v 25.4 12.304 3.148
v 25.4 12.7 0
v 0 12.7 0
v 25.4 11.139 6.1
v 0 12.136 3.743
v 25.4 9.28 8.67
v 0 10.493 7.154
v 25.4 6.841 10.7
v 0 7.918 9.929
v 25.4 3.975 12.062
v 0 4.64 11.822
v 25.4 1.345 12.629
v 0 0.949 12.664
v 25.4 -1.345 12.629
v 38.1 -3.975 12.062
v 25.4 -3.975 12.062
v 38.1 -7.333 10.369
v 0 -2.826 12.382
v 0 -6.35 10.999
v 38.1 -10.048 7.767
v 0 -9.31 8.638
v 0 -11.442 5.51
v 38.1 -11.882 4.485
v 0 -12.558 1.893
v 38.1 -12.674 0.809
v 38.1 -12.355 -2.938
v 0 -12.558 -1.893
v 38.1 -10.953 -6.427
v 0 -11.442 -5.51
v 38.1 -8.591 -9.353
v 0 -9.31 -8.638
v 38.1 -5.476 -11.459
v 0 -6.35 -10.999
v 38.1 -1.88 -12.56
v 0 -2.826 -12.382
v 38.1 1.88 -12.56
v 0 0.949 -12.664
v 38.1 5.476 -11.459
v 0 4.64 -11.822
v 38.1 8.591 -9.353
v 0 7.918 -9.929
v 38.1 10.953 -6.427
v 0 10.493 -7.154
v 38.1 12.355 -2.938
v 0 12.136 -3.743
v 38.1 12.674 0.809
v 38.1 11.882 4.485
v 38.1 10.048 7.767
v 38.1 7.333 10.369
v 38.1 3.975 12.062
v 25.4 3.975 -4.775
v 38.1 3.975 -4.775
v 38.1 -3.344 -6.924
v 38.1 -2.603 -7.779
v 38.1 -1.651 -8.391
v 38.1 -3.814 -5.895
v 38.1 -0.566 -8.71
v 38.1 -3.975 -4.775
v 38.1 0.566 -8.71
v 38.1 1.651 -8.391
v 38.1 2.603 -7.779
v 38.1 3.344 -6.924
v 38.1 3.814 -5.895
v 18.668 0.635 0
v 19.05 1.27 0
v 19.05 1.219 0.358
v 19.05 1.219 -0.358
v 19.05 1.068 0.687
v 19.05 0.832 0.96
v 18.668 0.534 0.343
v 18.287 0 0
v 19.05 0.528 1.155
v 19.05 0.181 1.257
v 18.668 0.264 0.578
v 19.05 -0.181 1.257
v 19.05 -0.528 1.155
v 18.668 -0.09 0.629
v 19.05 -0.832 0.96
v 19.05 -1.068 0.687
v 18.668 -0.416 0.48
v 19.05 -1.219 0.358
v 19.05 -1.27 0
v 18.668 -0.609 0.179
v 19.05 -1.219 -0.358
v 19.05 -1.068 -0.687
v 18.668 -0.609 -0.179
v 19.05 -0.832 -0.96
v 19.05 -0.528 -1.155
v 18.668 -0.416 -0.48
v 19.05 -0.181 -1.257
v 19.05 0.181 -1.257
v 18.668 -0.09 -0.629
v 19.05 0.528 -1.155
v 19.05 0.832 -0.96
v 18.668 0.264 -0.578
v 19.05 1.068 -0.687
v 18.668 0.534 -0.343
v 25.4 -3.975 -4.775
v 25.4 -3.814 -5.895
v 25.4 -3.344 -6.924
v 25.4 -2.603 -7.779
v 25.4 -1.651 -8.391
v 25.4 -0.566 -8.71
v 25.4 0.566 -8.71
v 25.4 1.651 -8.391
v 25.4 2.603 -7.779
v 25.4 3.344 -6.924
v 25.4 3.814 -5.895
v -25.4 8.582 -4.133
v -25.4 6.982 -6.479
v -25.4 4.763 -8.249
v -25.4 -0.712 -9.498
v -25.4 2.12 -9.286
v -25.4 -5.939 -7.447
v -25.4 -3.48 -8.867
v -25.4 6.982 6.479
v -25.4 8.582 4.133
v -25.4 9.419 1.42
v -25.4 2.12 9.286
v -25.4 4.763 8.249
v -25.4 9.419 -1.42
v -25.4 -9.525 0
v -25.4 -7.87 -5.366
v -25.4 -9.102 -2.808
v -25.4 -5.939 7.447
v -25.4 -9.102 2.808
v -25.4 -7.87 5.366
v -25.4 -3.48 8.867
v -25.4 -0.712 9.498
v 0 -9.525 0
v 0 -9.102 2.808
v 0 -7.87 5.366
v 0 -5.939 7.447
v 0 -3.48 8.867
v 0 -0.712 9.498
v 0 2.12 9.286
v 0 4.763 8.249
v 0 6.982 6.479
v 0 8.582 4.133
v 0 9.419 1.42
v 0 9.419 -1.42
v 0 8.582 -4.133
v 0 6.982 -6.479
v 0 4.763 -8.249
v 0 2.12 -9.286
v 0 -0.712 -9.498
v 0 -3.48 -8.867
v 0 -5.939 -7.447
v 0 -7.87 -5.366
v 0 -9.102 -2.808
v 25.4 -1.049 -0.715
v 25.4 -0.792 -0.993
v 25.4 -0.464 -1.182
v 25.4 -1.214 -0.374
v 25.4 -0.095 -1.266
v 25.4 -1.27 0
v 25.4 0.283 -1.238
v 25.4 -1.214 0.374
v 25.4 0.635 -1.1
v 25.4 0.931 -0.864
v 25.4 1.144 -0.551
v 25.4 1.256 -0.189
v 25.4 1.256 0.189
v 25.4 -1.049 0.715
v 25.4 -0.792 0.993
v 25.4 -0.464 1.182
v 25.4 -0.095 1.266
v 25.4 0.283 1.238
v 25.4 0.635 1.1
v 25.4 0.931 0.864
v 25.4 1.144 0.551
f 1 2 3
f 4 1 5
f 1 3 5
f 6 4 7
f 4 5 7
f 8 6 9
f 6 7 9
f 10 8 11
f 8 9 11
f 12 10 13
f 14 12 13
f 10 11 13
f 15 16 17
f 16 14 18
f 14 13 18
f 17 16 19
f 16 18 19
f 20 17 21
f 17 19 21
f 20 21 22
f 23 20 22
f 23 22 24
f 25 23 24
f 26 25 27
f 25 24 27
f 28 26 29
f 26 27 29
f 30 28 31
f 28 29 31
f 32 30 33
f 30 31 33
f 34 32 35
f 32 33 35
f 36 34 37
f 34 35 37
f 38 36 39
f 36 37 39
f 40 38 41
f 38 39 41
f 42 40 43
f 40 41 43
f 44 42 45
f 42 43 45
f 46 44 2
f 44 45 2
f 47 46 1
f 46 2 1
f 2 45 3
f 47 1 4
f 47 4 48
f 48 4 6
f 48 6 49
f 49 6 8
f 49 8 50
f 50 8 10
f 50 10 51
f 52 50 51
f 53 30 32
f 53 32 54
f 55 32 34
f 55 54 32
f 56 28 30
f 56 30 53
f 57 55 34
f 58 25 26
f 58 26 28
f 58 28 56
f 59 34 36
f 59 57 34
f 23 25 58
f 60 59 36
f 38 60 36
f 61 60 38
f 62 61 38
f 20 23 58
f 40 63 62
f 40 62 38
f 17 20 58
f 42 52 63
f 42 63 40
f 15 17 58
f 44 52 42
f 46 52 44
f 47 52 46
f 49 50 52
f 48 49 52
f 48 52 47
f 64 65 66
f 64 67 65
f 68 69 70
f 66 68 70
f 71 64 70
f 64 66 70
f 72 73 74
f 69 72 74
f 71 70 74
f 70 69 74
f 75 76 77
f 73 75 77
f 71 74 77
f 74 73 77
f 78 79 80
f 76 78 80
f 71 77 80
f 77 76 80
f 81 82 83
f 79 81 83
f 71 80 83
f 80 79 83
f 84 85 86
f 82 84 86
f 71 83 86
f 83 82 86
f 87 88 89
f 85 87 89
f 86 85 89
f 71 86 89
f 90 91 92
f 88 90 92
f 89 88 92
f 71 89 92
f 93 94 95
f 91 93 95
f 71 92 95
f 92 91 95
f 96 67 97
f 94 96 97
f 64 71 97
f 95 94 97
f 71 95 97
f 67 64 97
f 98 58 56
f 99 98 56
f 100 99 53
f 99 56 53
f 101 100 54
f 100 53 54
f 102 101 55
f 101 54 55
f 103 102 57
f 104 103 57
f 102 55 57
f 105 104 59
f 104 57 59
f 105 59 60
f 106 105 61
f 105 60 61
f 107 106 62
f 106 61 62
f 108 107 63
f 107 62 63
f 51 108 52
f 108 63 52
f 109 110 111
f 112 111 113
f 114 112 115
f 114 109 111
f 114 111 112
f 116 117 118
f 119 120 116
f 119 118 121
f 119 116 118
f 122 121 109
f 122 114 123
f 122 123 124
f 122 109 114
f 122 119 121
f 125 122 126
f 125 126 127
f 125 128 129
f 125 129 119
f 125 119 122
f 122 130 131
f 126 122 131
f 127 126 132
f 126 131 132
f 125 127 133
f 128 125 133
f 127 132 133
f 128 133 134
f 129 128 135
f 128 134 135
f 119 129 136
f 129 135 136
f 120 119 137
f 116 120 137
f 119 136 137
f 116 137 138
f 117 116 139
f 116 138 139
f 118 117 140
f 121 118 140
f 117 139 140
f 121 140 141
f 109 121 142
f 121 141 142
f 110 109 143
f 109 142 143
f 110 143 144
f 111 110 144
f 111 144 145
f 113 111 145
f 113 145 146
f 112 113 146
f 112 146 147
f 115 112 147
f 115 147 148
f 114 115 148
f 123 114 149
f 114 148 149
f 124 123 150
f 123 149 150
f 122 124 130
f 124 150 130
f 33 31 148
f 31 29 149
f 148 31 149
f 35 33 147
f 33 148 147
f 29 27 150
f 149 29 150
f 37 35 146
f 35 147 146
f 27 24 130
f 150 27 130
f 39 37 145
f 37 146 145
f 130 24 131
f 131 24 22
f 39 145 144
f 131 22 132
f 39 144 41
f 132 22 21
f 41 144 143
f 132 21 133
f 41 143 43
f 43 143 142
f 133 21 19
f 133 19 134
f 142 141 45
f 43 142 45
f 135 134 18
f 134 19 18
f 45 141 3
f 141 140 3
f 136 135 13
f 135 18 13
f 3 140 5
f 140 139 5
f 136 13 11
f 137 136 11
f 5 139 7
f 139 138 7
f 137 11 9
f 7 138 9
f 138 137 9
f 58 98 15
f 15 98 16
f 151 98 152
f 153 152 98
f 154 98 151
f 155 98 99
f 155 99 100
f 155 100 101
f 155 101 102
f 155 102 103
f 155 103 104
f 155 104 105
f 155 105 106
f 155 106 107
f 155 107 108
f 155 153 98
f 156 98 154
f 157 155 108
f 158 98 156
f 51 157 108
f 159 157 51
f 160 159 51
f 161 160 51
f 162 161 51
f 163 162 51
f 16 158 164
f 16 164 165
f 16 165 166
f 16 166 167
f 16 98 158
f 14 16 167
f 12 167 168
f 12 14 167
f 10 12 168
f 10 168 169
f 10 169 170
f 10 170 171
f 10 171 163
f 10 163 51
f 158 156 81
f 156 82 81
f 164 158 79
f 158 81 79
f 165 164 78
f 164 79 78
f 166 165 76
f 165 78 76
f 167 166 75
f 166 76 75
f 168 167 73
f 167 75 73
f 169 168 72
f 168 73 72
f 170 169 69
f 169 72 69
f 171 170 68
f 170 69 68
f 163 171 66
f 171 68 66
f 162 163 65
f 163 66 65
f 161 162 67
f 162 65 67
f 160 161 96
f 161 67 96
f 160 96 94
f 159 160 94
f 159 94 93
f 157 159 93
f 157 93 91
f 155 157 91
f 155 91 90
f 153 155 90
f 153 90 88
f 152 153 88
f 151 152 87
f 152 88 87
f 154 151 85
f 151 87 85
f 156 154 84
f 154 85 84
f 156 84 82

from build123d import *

# Parameters (mm, degrees)
F0_R     = 12.7
F1_DEPTH = 25.4
F3_DEPTH = 12.7
F4_R     = 9.525
F5_DEPTH = 25.4
F7_D     = 2.54
F7_DEPTH = 6.35
F7_TIP   = 0.7630929862
F9_DEPTH = 12.7


with BuildPart() as f1:
    # F0 (on Right) → F1 (new body)
    with BuildSketch(Plane.YZ):
        Circle(F0_R)
    extrude(amount=F1_DEPTH)

    # F2 (on face) → F3 (join)
    with BuildSketch(Plane.YZ.offset(25.4)):
        with BuildLine():
            ThreePointArc((3.9751, 0), (0, -3.9751), (-3.9751, 0))
            Line((-3.9751, 0), (-3.9751, 12.0618646979))
            ThreePointArc((-3.9751, 12.0618646979), (0, -12.7), (3.9751, 12.0618646979))
            Line((3.9751, 12.0618646979), (3.9751, 0))
        make_face()
    extrude(amount=F3_DEPTH)

    # F4 (on face) → F5 (join)
    with BuildSketch(Plane(origin=(0, 0, 0), x_dir=(0, -1, 0), z_dir=(-1, 0, 0))):
        Circle(F4_R)
    extrude(amount=F5_DEPTH)

    # F7
    with Locations(Plane.YZ.offset(25.4)):
        with Locations((0, 0)):
            Hole(F7_D / 2, depth=F7_DEPTH)
            with Locations((0, 0, -(F7_DEPTH + F7_TIP / 2))):  # 118° drill point
                Cone(0, F7_D / 2, F7_TIP, mode=Mode.SUBTRACT)


with BuildPart() as f9:
    # F8 (on face) → F9 (new body)
    with BuildSketch(Plane.YZ.offset(38.1)):
        with BuildLine():
            Line((-3.9751, 0), (-3.9751, -4.7752))
            ThreePointArc((-3.9751, -4.7752), (0, -8.7503), (3.9751, -4.7752))
            Line((3.9751, -4.7752), (3.9751, 0))
            ThreePointArc((3.9751, 0), (0, -3.9751), (-3.9751, 0))
        make_face()
    extrude(amount=-F9_DEPTH)


with BuildPart() as f1_1:
    add(f1.part)

    # F10: cut F9
    add(f9.part, mode=Mode.SUBTRACT)


solid = f1_1.part
